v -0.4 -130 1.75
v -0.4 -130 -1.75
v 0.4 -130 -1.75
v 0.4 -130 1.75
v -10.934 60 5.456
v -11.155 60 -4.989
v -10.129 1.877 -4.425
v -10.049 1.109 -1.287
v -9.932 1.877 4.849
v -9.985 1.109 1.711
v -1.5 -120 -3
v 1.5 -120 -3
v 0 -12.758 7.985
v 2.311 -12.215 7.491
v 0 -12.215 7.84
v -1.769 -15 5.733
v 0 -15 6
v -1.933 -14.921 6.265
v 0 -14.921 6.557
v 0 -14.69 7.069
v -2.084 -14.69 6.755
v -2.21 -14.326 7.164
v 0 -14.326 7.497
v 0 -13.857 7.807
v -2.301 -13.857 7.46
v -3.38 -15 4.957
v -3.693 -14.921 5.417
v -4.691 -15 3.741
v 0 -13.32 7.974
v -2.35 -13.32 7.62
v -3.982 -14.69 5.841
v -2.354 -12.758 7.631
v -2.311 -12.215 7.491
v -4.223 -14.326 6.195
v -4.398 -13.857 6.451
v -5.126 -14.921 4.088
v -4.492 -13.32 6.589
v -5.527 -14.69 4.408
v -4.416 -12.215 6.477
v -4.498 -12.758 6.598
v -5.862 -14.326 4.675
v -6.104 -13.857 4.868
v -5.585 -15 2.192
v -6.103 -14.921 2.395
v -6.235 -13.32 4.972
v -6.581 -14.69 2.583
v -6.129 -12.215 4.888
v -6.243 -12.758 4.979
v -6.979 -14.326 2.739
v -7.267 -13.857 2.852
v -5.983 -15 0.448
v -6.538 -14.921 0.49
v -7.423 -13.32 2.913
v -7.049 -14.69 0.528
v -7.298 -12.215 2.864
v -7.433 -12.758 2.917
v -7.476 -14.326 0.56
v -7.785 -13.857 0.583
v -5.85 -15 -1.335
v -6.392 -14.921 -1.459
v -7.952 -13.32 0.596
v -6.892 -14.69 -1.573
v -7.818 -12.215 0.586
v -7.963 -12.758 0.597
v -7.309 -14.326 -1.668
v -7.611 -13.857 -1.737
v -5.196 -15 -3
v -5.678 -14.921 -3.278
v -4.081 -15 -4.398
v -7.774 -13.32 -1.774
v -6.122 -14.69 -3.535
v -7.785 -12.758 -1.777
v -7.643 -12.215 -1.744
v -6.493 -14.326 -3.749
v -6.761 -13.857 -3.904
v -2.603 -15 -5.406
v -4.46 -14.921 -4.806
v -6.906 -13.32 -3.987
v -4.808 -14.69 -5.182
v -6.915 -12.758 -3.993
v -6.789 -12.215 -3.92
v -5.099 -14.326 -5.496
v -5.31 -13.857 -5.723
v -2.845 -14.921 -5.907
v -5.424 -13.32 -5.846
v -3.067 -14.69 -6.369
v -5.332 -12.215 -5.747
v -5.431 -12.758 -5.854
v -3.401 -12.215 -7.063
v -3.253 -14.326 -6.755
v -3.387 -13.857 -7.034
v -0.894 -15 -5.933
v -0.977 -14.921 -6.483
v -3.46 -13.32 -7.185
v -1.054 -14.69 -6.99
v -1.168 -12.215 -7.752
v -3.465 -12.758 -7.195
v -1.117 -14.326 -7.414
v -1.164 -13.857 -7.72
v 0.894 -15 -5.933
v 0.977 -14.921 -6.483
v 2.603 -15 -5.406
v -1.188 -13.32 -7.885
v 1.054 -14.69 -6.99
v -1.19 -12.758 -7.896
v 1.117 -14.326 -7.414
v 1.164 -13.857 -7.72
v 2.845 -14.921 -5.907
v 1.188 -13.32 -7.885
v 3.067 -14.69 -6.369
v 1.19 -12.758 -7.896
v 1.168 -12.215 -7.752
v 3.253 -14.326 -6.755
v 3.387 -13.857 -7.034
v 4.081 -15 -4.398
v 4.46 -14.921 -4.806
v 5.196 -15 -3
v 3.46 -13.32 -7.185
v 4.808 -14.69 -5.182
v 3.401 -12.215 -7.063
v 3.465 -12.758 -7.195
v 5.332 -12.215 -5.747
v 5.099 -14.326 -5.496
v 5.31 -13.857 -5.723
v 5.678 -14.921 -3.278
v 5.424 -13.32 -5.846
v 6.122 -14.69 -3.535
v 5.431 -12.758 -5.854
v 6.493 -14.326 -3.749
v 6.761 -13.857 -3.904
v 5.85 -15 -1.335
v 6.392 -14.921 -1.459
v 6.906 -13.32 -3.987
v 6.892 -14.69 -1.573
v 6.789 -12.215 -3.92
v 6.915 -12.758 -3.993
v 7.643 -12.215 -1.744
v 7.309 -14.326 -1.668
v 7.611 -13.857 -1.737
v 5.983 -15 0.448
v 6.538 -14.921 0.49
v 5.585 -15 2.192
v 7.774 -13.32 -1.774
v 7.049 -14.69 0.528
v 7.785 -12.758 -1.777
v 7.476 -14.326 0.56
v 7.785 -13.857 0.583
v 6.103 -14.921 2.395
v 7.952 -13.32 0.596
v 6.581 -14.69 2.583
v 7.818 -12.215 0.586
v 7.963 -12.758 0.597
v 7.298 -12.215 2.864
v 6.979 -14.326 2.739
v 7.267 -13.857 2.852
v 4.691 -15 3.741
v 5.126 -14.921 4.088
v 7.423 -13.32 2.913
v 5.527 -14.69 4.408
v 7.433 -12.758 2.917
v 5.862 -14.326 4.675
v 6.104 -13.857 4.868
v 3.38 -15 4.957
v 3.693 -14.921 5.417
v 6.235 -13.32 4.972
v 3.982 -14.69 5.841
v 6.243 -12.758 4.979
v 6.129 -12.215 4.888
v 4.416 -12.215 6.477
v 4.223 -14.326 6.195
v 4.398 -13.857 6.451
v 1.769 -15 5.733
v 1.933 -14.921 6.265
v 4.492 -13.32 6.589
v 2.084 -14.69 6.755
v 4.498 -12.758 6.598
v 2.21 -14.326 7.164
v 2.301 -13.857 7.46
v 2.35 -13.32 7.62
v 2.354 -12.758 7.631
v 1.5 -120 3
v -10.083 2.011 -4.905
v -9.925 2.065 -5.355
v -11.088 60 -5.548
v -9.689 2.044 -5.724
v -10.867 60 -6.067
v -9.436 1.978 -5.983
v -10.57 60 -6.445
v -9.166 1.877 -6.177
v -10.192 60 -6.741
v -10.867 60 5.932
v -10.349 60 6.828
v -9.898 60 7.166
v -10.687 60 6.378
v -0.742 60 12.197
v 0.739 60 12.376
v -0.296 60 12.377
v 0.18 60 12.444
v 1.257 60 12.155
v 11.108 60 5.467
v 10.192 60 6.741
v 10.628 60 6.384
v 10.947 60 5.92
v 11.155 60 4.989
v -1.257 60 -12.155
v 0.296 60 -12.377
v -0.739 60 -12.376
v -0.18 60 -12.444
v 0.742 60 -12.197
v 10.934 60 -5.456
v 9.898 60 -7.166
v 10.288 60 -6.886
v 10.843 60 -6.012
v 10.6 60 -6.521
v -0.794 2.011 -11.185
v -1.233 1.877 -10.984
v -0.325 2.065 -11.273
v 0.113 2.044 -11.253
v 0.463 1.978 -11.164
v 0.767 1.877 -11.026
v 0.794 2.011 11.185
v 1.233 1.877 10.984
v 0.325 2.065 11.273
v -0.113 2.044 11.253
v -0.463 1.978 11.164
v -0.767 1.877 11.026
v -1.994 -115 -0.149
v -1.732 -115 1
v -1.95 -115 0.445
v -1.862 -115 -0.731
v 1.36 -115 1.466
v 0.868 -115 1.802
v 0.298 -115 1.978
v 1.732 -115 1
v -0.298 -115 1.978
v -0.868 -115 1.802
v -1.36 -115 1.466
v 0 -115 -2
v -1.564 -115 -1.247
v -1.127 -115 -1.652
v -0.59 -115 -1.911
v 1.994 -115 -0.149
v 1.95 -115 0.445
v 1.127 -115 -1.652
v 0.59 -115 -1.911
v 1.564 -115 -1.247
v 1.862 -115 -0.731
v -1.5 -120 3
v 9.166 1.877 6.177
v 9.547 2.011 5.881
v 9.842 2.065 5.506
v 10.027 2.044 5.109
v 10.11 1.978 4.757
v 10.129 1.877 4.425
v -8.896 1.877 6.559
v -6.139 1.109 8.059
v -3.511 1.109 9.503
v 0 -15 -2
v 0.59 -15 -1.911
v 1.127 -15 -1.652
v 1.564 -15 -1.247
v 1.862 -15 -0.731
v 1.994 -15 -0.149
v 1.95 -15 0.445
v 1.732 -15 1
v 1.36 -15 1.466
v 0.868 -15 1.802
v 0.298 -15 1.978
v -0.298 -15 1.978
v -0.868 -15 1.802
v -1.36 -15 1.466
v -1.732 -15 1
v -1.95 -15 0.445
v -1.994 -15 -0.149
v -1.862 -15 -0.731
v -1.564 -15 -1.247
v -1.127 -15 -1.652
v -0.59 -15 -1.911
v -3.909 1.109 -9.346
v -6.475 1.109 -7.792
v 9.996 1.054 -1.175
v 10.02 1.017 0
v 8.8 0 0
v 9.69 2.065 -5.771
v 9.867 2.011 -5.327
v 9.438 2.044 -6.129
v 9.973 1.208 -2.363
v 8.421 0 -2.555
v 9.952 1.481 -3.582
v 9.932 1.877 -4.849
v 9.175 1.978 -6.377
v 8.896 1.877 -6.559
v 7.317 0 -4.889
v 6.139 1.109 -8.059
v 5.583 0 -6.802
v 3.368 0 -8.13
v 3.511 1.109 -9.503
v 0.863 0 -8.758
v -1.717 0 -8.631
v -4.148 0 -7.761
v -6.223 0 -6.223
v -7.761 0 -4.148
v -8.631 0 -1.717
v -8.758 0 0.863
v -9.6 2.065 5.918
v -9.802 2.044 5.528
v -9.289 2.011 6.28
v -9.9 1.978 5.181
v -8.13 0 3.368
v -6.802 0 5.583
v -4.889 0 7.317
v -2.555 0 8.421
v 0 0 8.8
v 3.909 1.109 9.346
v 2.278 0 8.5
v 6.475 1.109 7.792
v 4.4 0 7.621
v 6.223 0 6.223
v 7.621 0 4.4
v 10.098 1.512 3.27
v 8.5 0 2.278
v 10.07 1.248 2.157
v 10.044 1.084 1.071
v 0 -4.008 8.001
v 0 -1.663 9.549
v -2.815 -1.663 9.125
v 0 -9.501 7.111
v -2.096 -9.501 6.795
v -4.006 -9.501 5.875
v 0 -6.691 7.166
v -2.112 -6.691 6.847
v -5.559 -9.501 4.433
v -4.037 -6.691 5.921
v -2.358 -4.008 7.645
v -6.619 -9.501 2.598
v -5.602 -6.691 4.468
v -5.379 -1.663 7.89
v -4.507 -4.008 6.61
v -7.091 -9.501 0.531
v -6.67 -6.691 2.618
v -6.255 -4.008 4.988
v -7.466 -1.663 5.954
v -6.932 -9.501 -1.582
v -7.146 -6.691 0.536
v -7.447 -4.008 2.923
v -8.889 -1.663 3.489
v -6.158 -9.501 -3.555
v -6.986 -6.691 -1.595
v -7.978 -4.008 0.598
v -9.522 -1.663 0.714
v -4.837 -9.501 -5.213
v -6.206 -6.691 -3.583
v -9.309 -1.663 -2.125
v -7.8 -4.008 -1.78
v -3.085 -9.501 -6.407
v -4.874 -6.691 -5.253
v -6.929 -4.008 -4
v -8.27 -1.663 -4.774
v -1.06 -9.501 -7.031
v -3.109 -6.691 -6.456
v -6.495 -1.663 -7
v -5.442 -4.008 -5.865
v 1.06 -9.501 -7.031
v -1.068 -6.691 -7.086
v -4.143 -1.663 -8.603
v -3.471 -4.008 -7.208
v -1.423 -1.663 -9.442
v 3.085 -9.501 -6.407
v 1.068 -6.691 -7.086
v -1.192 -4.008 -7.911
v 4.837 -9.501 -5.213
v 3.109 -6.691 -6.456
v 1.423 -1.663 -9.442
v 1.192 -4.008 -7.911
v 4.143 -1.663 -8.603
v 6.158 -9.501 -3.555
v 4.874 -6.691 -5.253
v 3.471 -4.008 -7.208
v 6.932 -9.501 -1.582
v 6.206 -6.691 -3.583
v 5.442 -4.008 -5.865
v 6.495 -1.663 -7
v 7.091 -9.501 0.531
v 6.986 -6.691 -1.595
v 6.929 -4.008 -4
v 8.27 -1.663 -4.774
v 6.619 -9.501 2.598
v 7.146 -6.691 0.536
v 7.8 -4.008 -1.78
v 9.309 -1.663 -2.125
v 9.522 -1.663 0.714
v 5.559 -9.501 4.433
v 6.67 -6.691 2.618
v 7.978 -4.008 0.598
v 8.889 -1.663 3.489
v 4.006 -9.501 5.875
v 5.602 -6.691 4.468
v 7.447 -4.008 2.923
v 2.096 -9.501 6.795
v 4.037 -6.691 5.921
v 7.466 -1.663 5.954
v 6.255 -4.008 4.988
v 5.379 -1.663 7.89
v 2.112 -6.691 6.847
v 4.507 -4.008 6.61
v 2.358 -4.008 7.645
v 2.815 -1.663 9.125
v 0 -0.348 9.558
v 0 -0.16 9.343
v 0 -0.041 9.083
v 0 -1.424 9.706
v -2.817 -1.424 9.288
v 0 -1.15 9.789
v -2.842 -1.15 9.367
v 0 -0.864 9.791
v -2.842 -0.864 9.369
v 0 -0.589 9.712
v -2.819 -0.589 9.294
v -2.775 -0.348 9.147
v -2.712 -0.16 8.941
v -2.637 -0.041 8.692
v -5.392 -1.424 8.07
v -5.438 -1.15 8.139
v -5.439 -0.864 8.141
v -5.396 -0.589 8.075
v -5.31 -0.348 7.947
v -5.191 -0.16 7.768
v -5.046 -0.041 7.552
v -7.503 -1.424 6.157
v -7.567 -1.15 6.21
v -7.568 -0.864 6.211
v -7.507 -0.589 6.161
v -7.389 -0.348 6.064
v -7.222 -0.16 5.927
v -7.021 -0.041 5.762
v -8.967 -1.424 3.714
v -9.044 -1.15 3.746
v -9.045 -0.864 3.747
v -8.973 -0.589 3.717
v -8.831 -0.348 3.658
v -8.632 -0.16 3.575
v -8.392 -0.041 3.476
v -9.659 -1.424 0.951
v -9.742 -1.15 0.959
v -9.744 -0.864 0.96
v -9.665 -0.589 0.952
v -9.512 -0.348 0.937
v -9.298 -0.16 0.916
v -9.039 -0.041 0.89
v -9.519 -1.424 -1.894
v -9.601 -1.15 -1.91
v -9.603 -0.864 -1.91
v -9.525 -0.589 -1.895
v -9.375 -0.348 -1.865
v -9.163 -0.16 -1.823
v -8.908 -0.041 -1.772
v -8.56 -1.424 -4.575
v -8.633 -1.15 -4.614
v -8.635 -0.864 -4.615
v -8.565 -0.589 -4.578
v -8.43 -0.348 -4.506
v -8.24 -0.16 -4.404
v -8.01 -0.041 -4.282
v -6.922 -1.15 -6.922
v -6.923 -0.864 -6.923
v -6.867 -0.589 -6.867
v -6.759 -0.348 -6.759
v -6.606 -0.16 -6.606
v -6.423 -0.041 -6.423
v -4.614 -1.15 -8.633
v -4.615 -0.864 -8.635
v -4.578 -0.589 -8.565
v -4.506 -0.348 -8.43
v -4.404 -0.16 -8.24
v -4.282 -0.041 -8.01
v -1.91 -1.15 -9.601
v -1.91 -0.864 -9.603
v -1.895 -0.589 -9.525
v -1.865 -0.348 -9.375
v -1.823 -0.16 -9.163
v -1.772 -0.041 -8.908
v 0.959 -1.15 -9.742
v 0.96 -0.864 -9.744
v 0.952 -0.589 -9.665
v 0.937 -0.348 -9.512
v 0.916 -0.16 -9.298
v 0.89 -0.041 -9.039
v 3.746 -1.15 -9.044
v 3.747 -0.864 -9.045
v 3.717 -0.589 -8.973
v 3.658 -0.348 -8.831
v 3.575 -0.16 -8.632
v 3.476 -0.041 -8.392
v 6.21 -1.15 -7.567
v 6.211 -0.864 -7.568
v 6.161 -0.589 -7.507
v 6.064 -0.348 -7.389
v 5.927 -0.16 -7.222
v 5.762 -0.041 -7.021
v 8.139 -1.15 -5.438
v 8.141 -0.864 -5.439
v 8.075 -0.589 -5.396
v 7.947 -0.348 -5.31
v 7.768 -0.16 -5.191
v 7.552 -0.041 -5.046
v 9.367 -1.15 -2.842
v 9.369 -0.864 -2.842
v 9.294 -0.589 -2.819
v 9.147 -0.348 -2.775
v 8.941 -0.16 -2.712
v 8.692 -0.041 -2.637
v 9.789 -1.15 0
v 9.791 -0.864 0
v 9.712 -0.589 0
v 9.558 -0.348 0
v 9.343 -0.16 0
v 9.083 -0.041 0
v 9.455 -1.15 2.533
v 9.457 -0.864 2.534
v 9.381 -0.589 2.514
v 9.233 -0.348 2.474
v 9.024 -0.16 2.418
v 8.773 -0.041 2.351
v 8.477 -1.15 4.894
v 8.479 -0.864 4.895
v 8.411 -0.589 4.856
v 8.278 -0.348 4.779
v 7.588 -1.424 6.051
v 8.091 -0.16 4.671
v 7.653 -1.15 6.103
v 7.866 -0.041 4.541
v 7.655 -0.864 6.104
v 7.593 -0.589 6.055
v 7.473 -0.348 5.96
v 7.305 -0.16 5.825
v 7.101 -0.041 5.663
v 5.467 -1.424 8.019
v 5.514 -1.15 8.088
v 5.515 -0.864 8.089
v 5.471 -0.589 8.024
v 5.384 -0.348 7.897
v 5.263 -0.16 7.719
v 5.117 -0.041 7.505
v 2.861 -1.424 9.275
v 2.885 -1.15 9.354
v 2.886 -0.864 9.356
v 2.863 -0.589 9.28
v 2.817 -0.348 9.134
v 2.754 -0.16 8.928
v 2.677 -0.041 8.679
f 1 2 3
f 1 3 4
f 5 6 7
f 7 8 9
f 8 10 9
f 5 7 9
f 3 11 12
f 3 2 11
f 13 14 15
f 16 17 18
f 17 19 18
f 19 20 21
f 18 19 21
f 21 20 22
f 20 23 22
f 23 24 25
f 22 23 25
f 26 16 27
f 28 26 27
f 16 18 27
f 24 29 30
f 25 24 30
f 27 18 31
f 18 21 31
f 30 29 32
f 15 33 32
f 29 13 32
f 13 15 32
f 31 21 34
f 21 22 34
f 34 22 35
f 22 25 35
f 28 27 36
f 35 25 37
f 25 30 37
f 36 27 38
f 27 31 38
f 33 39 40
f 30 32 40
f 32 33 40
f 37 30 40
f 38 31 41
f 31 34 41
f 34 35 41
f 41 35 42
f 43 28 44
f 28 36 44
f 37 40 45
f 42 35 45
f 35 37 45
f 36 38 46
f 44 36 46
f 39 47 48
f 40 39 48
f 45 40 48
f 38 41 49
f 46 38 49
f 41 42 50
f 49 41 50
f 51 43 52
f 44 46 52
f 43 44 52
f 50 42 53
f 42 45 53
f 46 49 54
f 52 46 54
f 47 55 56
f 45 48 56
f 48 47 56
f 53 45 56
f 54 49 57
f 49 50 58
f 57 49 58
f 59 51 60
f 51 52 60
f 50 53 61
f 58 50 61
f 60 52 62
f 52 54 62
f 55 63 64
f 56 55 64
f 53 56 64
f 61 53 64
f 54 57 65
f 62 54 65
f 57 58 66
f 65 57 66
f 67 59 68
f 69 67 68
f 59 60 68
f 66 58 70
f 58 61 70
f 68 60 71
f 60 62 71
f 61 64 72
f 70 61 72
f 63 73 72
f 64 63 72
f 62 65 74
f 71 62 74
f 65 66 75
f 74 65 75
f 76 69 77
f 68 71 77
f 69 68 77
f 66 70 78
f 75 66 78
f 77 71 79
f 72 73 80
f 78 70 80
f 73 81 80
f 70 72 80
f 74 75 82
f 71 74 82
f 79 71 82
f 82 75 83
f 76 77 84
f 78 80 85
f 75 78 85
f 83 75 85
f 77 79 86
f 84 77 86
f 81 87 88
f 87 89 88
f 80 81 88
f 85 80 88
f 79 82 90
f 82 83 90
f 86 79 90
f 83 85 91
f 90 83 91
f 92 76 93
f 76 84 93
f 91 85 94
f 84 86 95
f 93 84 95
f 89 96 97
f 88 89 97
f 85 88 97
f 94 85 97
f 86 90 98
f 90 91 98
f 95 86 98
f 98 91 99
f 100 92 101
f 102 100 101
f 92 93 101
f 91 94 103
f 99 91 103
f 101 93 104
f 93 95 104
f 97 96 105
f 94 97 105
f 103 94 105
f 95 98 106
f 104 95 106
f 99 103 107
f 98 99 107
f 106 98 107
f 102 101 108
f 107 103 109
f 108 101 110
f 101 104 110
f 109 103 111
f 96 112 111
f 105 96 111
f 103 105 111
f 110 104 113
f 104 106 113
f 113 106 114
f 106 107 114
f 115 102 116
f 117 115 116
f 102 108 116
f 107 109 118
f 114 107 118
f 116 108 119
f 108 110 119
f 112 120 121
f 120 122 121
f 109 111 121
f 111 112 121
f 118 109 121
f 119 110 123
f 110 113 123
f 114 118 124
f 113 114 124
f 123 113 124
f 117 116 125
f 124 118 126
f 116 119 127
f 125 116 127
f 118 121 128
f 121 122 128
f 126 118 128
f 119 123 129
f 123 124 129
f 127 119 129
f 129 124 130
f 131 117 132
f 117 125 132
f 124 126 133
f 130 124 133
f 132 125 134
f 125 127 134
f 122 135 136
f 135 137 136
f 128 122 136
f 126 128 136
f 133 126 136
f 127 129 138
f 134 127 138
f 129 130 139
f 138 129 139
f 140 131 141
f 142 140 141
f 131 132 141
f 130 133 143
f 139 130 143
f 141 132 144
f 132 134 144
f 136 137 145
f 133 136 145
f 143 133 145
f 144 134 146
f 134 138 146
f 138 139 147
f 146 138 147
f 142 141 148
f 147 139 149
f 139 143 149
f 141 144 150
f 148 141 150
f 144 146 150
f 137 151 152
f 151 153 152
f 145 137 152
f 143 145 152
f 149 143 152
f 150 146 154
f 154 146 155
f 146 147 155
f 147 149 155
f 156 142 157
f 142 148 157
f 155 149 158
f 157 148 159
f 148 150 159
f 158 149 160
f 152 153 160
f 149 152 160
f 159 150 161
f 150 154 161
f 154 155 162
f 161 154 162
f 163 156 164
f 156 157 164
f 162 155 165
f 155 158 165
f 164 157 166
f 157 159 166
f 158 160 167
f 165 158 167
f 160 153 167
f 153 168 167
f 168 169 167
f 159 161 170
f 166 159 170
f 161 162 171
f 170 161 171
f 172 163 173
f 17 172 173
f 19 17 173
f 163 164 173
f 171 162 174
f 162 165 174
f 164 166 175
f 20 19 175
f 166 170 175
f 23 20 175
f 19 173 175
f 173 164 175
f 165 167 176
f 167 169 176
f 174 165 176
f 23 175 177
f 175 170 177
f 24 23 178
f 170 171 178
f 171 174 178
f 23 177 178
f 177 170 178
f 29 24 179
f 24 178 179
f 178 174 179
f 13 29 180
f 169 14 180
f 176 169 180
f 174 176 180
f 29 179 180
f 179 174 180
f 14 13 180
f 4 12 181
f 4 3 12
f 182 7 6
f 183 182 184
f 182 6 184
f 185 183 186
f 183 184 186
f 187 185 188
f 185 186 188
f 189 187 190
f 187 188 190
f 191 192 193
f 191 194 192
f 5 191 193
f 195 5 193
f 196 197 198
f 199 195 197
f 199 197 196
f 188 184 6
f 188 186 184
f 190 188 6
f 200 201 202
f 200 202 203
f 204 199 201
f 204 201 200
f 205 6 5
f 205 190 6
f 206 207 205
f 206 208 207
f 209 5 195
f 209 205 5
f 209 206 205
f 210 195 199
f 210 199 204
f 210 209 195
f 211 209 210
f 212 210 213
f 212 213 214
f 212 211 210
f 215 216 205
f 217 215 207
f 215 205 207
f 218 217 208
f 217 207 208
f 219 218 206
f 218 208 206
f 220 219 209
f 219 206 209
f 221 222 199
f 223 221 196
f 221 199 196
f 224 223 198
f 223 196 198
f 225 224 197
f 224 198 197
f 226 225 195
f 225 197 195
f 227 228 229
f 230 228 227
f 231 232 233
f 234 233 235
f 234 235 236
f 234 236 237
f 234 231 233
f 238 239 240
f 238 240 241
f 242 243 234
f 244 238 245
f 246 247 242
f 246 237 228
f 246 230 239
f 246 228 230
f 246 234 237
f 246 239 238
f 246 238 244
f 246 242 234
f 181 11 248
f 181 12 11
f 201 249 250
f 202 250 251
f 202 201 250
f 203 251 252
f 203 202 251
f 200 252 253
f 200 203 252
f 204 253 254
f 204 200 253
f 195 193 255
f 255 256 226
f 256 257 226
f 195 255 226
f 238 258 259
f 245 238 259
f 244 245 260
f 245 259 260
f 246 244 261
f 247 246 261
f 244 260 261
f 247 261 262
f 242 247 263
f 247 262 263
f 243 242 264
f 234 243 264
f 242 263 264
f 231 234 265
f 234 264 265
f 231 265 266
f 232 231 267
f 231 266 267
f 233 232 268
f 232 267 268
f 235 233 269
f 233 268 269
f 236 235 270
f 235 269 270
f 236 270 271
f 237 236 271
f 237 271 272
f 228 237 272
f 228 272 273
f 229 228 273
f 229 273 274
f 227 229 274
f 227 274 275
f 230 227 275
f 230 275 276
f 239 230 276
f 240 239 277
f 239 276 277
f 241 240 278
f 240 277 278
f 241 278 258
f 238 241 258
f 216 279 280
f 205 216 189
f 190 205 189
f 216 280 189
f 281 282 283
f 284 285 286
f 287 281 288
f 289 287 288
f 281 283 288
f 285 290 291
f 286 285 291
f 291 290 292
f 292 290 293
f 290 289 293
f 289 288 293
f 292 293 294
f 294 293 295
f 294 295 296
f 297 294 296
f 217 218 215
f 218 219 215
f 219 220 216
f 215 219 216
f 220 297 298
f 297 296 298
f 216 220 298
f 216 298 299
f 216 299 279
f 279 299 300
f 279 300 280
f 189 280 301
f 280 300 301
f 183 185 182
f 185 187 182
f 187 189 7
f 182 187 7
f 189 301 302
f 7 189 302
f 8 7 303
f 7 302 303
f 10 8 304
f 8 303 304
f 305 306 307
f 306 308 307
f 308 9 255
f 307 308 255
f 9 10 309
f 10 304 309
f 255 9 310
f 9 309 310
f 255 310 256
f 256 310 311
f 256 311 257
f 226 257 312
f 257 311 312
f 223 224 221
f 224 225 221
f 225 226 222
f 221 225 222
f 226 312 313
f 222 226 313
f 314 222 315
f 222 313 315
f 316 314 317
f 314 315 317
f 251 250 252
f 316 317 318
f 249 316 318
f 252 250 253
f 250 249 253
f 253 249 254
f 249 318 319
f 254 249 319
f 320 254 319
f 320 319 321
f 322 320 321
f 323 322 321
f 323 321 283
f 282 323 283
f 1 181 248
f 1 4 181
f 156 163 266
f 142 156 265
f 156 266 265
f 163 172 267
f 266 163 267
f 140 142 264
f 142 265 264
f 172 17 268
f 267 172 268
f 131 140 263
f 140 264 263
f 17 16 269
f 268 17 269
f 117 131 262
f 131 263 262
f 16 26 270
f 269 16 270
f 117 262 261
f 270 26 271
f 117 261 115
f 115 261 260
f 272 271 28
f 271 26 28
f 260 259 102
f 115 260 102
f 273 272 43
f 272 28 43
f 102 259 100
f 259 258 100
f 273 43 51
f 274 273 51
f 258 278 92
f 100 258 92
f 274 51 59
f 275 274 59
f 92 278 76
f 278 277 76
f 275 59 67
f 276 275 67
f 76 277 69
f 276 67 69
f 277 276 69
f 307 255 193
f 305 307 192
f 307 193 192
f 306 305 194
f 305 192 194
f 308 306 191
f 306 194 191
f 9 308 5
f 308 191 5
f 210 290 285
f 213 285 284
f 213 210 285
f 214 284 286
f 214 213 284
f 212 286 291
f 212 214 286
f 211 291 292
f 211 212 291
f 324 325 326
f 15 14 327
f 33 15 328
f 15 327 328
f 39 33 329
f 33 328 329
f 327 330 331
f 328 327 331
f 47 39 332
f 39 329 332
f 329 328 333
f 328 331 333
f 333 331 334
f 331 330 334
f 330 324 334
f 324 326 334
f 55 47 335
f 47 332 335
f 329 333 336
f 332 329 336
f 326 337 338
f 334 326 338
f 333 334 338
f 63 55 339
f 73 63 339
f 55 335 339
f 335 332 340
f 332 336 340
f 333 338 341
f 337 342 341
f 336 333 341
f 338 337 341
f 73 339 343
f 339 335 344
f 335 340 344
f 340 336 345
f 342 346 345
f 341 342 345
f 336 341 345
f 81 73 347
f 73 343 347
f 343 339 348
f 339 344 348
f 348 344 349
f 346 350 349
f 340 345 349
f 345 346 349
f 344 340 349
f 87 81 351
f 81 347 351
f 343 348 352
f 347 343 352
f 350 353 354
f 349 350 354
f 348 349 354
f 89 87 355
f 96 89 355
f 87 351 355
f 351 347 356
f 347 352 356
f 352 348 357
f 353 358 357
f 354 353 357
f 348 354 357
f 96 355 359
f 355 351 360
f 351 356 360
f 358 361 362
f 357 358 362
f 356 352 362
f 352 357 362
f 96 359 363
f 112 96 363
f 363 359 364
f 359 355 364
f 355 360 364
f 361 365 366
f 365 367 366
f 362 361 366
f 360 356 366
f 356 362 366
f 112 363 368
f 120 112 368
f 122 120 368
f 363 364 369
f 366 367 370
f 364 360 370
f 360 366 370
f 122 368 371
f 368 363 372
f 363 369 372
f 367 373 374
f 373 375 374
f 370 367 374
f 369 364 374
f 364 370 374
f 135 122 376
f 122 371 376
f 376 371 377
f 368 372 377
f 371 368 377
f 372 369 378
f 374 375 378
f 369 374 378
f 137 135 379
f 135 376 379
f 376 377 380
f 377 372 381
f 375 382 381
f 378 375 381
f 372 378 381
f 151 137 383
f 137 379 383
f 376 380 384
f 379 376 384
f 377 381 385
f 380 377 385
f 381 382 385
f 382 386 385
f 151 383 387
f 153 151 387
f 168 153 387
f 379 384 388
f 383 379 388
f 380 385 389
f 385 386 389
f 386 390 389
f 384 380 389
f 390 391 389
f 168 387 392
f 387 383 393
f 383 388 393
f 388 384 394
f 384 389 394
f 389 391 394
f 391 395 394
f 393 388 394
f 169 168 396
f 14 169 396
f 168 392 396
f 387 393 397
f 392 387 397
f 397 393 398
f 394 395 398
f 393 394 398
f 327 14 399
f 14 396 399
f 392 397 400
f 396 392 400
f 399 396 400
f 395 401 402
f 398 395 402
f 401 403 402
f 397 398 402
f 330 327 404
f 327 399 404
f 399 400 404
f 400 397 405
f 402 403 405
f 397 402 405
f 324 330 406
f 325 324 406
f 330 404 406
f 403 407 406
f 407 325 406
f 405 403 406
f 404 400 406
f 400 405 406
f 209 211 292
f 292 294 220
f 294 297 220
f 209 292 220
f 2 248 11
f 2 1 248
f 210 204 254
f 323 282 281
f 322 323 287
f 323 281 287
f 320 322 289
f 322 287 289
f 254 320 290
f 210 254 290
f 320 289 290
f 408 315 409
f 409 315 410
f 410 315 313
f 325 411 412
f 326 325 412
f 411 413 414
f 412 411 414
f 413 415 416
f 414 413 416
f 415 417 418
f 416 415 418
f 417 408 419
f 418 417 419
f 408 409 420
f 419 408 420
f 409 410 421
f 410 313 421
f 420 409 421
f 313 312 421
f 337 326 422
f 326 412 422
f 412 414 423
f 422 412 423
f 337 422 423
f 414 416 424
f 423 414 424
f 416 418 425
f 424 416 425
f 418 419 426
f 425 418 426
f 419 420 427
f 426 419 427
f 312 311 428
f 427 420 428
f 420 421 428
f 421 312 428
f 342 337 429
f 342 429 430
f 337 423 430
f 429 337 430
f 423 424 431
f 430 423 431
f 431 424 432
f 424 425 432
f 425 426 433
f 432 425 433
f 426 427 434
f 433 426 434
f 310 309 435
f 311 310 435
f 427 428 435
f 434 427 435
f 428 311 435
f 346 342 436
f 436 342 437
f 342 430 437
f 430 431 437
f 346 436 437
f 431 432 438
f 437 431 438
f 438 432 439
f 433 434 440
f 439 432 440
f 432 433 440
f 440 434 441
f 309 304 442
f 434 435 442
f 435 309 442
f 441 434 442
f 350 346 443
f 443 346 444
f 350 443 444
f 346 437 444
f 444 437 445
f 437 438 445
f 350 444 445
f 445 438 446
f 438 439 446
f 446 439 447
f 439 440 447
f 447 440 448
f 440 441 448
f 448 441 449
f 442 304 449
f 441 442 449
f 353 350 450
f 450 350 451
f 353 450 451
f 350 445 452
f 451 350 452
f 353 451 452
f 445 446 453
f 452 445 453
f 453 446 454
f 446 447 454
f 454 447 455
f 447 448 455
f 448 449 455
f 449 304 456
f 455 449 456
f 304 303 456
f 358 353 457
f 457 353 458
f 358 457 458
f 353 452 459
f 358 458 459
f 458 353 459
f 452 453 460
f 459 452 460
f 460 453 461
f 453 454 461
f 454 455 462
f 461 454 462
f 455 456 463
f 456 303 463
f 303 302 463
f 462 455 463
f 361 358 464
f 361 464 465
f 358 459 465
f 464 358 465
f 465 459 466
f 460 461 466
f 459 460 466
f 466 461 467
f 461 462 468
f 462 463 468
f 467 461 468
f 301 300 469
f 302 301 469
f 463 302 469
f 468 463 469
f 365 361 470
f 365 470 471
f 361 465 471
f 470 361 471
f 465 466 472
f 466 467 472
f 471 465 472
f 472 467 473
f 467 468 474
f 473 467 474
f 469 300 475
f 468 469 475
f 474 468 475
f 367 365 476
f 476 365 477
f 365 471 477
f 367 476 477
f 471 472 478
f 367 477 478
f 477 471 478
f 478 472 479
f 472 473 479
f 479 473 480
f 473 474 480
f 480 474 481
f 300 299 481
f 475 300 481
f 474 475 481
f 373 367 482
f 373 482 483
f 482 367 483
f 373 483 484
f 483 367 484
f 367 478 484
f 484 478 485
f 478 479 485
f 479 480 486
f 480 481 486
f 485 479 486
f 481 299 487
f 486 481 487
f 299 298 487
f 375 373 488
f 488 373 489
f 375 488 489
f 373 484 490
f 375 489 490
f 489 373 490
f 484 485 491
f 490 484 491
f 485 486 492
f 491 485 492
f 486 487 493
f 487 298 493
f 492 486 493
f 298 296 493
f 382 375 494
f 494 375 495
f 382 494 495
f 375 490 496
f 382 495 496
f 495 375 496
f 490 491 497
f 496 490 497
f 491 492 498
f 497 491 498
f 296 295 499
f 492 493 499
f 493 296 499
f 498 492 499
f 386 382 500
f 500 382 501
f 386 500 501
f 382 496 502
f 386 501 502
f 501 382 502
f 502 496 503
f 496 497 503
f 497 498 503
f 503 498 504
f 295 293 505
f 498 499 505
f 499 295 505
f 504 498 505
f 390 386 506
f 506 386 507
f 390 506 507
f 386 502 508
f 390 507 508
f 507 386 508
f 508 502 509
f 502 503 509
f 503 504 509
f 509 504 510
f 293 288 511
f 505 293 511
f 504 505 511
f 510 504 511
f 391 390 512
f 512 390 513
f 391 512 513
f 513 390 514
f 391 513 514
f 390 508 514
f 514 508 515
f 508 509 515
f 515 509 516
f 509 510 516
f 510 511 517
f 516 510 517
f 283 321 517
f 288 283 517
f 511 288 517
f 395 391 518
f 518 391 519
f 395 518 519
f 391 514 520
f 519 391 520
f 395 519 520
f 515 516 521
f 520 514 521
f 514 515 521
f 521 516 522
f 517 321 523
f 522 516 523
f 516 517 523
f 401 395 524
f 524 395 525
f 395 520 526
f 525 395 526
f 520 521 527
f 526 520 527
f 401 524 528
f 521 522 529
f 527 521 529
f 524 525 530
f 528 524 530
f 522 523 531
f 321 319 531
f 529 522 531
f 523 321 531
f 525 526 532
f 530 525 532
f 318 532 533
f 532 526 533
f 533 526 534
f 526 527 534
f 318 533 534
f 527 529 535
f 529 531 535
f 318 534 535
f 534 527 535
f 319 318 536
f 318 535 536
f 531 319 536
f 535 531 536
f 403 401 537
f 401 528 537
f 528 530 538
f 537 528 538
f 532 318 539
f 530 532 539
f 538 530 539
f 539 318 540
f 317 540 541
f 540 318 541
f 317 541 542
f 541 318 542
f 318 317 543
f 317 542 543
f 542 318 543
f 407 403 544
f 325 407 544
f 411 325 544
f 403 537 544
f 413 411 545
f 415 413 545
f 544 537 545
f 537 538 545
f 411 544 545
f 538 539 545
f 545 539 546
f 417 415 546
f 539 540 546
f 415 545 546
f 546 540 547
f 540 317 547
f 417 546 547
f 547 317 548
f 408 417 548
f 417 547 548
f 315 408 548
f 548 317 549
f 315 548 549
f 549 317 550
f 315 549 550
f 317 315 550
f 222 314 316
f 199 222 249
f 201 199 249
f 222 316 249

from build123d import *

# Parameters (mm, degrees)
EXTRUDE_1_DEPTH = 60
DRAFT_1_ANGLE   = 1
FILLET_1_R      = 2
SKETCH_4_R      = 2
EXTRUDE_2_DEPTH = 100


# Read off the part's stored shape, not the designer's step: 切除-旋转-薄壁1
with BuildPart() as part:
    # 草图1 → 凸台-拉伸1 (new body)
    with BuildSketch(Plane(origin=(0, 0, 0), x_dir=(1, 0, 0), z_dir=(0, 1, 0))):
        Polygon((0.244326354, -11.544420209), (10.11992435, -5.560617276), (9.875597996, 5.983802934), (-0.244326354, 11.544420209), (-10.11992435, 5.560617276), (-9.875597996, -5.983802934), align=None)
    extrude(amount=EXTRUDE_1_DEPTH)

    # 拔模1
    draft_1_faces = [part.faces().sort_by_distance(p)[0] for p in [
        (-9.997761173, 30, 0.211592829),
        (-4.815635821, 30, 8.764111571),
        (5.182125352, 30, 8.552518742),
        (9.997761173, 30, -0.211592829),
        (4.815635821, 30, -8.764111571),
        (-5.182125352, 30, -8.552518742),
    ]]
    draft(draft_1_faces, Plane(origin=(0, 0, 0), x_dir=(0, 0, -1), z_dir=(0, -1, 0)), DRAFT_1_ANGLE)

    # 切除-旋转-薄壁1 outline → 切除-旋转-薄壁1 (revolve, cut)
    with BuildSketch(Plane.XY):
        Polygon((11.593936647, 2.32828054), (8.8, 0), (11.593936647, 0), align=None)
    revolve(axis=Axis((0, 0, 0), (0, 1, 0)), mode=Mode.SUBTRACT)

    # 圆角1
    fillet_1_edges = [part.edges().sort_by_distance(p)[0] for p in [
        (-0.257617025, 31.164138617, -12.172404417),
        (10.412802938, 31.164138617, -6.309305096),
        (10.670419963, 31.164138617, 5.863099321),
        (-10.670419963, 31.164138617, -5.863099321),
        (0.257617025, 31.164138617, 12.172404417),
        (-10.412802938, 31.164138617, 6.309305096),
    ]]
    fillet(fillet_1_edges, radius=FILLET_1_R)

    # 草图3 → 旋转1 (revolve)
    with BuildSketch(Plane.XY, mode=Mode.PRIVATE) as revolve_1_sk:
        with BuildLine():
            Line((0, -15), (-6, -15))
            ThreePointArc((-6, -15), (-7.668814978, -14.102296044), (-7.839528148, -12.215056568))
            ThreePointArc((-7.839528148, -12.215056568), (-7.165836652, -6.691339771), (-9.548833535, -1.662758128))
            ThreePointArc((-9.548833535, -1.662758128), (-9.711799903, -0.589365204), (-8.8, 0))
            Line((-8.8, 0), (0, 0))
            Line((0, 0), (0, -15))
        make_face()
    revolve(revolve_1_sk.sketch.rotate(Axis((0, 0, 0), (0, -1, 0)), 270), axis=Axis((0, 0, 0), (0, -1, 0)))

    # 草图4 → 凸台-拉伸2 (add)
    with BuildSketch(Plane(origin=(0, -15, 0), x_dir=(-1, 0, 0), z_dir=(0, -1, 0))):
        with Locations(Location((0, 0, 0), (0, 0, 90))):
            Circle(SKETCH_4_R)
    extrude(amount=EXTRUDE_2_DEPTH)


with BuildPart() as body_2:
    # 草图6 → 放样1 section 0
    with BuildSketch(Plane(origin=(0, -120, 0), x_dir=(-1, 0, 0), z_dir=(0, -1, 0))):
        with BuildLine():
            Line((1.5, 3), (-1.5, 3))
            Line((-1.5, 3), (-1.5, -3))
            Line((-1.5, -3), (1.5, -3))
            Line((1.5, -3), (1.5, 3))
        make_face()
    # 草图7 → 放样1 section 1
    with BuildSketch(Plane(origin=(0, -130, 0), x_dir=(-1, 0, 0), z_dir=(0, -1, 0))):
        with BuildLine():
            Line((-0.4, 1.75), (0.4, 1.75))
            Line((0.4, 1.75), (0.4, -1.75))
            Line((0.4, -1.75), (-0.4, -1.75))
            Line((-0.4, -1.75), (-0.4, 1.75))
        make_face()
    loft()


solid = Compound([part.part, body_2.part])
